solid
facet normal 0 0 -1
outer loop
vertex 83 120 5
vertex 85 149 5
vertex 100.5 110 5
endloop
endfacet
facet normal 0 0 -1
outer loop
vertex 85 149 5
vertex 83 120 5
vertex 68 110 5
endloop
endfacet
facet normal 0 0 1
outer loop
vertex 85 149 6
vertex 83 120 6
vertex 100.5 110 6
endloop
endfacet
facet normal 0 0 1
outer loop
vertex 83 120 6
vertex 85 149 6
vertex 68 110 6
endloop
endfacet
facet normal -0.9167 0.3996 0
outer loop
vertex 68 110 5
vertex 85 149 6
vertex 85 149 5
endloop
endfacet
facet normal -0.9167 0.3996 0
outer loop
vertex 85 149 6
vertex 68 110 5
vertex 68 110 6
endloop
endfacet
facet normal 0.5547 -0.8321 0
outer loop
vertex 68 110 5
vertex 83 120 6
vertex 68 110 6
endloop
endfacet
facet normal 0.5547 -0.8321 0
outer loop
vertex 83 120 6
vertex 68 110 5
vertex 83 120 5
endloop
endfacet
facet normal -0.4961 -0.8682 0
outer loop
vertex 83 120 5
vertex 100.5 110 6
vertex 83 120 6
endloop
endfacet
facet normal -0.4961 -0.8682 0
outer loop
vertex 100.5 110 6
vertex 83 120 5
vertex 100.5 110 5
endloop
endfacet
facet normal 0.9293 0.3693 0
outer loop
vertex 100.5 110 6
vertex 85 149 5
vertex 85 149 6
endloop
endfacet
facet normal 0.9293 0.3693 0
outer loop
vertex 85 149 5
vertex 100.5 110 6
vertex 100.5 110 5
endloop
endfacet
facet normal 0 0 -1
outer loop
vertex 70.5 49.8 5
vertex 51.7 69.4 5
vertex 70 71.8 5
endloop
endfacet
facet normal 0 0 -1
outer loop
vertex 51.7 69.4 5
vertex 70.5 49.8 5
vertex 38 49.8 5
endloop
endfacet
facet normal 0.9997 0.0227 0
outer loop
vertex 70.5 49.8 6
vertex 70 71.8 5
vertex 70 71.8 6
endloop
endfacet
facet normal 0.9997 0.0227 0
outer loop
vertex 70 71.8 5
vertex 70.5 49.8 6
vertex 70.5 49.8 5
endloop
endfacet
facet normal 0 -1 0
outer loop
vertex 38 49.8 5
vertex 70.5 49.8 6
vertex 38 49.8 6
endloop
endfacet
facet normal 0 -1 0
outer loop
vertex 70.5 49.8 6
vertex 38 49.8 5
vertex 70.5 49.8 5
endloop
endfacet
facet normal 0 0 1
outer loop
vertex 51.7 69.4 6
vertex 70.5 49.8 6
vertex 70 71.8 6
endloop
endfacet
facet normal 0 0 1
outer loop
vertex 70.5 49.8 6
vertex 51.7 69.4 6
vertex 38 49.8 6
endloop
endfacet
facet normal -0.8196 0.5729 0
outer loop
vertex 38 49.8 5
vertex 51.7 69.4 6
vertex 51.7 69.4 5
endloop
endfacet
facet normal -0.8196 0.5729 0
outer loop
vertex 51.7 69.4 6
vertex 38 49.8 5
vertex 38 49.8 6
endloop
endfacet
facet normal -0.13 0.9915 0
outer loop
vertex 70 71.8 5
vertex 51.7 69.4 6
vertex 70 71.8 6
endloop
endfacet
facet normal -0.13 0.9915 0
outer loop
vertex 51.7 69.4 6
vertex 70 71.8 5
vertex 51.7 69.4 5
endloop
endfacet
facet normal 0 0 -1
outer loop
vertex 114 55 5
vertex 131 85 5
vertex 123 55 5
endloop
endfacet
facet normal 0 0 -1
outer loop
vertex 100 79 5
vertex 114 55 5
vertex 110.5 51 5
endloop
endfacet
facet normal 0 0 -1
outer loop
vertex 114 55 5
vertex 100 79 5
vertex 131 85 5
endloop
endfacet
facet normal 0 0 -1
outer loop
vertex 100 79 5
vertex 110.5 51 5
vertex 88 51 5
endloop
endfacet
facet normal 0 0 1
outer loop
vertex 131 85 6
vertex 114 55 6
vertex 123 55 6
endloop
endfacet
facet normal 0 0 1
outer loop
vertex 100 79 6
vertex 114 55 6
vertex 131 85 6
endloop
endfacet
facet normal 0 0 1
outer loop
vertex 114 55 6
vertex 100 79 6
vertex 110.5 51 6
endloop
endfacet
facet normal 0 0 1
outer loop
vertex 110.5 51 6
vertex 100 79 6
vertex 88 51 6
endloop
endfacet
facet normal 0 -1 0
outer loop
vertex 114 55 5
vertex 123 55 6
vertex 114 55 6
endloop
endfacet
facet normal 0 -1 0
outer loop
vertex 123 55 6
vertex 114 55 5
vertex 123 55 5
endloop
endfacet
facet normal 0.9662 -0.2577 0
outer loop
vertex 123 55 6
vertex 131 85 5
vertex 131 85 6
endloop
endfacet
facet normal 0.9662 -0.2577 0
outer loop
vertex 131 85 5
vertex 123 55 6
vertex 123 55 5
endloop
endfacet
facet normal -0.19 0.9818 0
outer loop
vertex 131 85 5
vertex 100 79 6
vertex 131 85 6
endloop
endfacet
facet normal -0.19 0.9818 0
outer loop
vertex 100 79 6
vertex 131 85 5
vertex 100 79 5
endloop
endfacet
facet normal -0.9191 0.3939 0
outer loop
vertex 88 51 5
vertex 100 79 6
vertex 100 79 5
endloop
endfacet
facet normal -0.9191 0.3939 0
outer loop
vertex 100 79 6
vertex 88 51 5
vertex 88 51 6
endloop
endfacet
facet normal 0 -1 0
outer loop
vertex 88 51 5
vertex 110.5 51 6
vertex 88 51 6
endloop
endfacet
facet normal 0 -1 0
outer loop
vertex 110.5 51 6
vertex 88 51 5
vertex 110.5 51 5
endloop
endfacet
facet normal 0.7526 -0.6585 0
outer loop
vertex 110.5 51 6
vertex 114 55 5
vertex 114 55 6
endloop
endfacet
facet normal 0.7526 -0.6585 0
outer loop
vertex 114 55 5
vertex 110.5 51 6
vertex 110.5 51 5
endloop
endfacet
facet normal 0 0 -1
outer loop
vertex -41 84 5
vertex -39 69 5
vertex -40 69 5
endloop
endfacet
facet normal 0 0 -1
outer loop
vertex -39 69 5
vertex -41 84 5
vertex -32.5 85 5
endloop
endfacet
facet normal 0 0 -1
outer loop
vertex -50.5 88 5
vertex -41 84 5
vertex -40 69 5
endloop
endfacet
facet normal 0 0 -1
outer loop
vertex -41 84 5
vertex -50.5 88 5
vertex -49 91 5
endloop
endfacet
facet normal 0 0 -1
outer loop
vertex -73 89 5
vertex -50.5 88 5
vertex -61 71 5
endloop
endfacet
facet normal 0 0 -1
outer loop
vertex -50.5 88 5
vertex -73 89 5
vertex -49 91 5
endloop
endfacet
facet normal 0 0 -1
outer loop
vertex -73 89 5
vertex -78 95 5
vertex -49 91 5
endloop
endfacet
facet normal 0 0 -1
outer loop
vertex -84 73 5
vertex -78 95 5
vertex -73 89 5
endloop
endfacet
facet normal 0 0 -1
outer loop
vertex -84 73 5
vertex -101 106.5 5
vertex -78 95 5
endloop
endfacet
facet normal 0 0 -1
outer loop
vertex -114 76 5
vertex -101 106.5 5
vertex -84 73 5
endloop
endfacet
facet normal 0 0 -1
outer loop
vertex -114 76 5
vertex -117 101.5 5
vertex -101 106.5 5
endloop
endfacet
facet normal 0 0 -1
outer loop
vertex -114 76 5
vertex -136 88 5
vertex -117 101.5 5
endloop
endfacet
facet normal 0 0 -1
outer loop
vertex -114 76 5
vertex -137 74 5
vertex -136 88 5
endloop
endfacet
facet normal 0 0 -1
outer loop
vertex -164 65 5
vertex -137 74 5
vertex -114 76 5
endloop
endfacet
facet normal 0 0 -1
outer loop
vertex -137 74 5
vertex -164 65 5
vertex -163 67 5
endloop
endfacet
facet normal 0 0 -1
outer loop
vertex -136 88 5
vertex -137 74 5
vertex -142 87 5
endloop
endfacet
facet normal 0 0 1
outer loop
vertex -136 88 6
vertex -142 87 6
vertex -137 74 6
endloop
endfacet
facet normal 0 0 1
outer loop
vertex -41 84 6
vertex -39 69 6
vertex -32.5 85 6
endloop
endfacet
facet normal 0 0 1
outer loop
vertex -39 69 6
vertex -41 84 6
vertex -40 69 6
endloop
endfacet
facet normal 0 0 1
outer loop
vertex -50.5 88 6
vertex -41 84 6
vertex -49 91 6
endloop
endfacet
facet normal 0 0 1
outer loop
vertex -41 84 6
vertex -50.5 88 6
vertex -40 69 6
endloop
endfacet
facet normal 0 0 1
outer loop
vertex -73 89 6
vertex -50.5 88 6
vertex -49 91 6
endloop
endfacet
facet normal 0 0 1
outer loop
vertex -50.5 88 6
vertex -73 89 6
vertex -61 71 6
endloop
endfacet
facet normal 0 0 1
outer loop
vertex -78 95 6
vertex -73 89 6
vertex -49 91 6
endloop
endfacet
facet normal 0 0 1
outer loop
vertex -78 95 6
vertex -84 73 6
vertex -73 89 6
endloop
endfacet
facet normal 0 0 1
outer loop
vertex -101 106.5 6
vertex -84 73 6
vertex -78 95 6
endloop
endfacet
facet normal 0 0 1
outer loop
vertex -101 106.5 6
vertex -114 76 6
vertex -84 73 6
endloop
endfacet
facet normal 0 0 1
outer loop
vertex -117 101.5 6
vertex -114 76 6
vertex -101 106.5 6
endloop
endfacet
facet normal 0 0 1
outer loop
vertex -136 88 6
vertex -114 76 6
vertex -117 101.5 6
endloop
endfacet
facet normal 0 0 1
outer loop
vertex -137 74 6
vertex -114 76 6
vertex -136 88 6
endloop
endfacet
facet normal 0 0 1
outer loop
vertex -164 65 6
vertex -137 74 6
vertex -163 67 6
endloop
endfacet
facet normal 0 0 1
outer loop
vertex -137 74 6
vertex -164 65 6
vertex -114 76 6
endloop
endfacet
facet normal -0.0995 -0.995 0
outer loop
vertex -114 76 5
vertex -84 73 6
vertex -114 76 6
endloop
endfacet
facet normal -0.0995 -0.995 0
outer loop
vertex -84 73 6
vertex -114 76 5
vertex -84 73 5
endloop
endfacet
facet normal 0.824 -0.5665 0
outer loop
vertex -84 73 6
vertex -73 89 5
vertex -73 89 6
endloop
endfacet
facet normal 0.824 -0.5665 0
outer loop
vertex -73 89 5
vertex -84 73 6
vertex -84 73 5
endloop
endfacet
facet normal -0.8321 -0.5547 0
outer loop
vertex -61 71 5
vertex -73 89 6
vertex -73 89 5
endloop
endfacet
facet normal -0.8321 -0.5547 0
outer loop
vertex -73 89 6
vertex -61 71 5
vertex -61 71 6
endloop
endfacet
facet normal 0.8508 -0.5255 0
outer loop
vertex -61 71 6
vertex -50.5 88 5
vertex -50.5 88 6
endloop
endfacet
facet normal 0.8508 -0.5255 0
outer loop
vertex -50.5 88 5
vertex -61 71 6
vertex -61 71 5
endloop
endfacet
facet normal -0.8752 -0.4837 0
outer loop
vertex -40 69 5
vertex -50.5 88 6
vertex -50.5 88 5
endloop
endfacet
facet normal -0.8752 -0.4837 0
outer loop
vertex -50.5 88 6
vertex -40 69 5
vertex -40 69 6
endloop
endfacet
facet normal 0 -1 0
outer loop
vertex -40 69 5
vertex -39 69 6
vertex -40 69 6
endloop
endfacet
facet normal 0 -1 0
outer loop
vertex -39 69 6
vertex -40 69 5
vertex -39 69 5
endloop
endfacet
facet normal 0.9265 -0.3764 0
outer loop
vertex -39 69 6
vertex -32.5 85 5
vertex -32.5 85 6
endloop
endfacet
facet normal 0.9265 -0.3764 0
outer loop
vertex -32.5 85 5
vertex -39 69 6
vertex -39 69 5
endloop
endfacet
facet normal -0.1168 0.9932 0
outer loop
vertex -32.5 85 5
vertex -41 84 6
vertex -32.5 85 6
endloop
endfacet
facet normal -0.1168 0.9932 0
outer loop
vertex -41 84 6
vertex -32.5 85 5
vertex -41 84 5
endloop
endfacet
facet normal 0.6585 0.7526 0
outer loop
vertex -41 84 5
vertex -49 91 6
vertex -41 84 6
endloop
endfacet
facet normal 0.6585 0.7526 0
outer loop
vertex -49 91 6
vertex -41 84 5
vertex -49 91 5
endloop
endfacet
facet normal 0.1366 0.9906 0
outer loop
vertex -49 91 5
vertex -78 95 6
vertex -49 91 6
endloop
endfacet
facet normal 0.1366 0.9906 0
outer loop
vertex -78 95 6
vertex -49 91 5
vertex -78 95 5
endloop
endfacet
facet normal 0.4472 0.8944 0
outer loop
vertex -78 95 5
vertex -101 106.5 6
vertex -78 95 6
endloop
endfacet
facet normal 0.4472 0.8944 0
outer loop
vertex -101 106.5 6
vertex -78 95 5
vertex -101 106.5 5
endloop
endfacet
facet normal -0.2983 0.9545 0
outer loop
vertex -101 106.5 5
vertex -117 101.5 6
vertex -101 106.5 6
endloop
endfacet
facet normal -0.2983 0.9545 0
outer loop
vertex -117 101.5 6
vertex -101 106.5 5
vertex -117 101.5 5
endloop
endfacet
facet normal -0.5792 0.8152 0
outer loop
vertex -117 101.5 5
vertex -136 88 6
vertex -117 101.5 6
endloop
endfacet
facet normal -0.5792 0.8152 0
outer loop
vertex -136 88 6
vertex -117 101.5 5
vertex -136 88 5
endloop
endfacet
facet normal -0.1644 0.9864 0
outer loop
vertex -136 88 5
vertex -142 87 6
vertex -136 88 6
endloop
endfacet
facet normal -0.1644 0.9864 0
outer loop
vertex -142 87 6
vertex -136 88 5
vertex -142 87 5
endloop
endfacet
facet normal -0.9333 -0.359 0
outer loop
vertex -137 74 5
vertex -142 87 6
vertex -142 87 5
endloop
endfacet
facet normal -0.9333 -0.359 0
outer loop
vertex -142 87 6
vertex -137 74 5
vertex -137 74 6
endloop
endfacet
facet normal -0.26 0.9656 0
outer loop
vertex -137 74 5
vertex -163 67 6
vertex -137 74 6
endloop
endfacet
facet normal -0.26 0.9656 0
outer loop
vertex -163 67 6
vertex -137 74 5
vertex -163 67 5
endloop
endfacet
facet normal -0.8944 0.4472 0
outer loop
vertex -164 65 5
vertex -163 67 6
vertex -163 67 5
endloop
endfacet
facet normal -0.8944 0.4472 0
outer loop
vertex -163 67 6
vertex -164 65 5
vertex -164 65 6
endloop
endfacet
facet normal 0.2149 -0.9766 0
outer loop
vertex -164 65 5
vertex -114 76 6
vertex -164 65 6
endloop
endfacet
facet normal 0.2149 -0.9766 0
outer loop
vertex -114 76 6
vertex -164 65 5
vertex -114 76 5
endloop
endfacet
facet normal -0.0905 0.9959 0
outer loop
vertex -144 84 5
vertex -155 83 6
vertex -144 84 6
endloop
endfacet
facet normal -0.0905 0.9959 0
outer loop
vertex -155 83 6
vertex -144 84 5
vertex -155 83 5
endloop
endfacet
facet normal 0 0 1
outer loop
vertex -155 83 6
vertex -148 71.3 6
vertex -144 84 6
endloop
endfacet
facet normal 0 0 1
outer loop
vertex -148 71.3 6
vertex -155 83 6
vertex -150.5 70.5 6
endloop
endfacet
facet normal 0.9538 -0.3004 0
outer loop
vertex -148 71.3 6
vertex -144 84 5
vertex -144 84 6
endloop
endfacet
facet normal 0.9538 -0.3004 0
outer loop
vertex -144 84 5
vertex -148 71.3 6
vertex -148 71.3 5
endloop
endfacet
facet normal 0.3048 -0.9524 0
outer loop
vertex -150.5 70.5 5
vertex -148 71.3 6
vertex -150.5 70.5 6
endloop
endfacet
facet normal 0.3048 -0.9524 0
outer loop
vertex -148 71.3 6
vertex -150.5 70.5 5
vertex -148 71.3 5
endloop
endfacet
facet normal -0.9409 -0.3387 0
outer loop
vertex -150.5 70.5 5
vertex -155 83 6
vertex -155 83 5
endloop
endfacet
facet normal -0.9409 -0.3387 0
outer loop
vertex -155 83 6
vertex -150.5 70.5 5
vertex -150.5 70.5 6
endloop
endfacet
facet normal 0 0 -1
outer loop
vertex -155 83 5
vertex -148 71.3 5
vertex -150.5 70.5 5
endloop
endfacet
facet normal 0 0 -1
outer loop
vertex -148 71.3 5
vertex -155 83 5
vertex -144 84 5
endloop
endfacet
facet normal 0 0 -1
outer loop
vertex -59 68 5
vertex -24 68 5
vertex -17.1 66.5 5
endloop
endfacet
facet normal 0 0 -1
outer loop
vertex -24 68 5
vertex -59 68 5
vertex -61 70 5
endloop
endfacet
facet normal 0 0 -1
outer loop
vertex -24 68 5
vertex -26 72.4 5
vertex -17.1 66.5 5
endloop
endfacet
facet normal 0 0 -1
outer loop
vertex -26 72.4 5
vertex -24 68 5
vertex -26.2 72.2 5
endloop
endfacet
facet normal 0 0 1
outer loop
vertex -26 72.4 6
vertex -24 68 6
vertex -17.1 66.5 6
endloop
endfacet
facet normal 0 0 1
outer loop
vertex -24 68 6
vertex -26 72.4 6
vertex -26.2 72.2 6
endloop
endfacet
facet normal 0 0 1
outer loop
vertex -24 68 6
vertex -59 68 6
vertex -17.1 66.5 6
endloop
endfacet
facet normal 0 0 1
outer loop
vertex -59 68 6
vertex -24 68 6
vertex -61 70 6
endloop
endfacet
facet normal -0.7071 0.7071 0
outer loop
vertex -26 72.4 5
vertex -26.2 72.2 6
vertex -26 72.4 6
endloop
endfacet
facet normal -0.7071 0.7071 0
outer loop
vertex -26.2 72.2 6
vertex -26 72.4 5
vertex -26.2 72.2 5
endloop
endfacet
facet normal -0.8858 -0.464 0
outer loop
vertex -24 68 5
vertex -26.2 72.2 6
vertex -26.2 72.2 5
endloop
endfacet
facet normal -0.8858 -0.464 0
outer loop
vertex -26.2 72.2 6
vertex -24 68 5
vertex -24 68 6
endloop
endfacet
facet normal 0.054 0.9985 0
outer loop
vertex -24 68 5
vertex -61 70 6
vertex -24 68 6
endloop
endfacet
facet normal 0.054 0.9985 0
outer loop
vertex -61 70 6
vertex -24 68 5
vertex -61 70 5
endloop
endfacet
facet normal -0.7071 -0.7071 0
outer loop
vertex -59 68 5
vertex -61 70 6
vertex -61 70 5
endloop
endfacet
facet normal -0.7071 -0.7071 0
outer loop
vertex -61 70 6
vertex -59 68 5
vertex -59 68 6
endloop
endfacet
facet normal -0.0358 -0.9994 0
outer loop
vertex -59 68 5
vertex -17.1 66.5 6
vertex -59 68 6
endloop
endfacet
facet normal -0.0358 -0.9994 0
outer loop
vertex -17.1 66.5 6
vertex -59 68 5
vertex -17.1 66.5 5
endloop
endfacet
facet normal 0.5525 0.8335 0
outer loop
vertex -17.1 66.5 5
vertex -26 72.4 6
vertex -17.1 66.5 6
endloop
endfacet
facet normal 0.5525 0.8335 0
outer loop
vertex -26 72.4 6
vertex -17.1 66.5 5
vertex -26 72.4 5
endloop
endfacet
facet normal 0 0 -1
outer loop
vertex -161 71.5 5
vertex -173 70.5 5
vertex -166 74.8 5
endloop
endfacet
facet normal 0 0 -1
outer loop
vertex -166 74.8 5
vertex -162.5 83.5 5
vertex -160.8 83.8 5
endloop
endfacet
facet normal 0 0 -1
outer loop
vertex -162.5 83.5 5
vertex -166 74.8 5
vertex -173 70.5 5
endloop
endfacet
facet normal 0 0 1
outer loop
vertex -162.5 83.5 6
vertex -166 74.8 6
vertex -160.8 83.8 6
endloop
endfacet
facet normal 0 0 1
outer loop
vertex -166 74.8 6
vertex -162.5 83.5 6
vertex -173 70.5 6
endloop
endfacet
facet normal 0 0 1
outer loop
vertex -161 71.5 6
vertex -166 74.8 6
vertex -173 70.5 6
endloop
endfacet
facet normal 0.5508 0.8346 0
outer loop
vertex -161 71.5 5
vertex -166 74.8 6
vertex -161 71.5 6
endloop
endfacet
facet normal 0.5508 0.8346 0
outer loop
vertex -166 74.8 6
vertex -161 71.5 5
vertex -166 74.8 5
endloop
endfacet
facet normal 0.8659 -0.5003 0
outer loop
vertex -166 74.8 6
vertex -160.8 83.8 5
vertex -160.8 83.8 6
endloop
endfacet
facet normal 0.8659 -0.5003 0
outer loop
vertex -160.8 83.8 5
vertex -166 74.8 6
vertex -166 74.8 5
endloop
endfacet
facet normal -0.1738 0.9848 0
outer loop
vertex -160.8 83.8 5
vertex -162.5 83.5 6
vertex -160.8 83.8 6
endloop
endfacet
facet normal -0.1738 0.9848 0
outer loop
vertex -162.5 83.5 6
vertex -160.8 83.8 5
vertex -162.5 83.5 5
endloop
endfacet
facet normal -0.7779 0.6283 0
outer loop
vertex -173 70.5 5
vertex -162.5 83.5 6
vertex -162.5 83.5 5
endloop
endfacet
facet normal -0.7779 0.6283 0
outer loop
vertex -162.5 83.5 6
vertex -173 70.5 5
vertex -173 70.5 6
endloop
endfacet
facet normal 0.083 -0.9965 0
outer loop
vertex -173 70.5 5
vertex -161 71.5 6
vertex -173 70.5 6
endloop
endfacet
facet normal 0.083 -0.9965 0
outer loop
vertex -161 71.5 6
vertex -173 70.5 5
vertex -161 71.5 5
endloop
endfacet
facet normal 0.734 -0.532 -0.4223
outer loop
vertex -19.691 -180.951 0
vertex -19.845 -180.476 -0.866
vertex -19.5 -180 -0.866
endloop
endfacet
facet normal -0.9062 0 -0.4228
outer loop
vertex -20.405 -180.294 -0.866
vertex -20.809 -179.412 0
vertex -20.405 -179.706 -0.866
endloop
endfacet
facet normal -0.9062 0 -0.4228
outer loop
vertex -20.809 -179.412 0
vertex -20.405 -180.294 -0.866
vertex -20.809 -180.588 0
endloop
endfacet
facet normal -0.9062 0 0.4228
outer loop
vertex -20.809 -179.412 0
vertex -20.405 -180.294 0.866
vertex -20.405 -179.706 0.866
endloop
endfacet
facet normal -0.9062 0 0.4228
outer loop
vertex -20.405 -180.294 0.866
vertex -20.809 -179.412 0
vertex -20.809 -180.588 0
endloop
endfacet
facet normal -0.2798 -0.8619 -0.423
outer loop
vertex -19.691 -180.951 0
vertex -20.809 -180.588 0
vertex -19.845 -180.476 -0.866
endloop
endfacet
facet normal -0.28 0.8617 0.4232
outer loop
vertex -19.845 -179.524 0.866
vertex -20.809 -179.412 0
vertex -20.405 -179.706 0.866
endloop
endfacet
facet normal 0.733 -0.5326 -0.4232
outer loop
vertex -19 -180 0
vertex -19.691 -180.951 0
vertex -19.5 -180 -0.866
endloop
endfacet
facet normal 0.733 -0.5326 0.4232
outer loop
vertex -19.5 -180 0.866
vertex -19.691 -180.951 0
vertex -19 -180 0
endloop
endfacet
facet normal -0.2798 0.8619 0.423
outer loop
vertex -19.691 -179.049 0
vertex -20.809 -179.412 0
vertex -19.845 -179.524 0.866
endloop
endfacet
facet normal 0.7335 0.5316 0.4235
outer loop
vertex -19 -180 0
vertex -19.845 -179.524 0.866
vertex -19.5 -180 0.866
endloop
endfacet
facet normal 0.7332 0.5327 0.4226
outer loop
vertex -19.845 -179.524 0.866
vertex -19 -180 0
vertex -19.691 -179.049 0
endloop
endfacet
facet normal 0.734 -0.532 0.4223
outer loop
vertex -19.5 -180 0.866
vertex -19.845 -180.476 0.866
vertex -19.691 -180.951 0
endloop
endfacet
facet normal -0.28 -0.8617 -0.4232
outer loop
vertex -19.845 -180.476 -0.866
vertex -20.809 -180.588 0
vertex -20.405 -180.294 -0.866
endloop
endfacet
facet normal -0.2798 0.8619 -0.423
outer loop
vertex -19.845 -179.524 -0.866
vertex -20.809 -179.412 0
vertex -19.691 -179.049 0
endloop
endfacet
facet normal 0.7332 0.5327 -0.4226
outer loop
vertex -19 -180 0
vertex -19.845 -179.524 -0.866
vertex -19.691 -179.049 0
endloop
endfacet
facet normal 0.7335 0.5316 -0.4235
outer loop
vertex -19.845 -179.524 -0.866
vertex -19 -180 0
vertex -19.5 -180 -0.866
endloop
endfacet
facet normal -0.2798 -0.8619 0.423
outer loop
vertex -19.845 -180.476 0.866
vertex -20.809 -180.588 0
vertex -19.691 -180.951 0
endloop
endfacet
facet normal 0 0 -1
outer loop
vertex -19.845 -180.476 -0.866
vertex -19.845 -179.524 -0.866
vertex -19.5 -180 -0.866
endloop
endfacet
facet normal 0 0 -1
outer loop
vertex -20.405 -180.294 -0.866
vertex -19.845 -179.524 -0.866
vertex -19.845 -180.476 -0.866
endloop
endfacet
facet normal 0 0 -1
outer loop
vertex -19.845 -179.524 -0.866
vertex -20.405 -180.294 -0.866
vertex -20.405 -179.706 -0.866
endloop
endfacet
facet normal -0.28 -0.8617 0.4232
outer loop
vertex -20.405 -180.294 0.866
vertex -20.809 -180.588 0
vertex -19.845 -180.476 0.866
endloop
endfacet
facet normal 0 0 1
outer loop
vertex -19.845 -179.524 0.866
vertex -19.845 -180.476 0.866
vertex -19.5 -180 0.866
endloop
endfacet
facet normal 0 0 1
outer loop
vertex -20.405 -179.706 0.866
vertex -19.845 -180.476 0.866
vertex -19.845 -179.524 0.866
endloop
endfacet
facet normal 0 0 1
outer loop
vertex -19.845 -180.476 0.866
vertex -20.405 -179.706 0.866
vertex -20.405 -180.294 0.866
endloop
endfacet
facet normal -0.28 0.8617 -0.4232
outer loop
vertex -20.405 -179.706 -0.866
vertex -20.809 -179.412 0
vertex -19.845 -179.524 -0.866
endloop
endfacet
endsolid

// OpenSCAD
// Nufringen 2

Silouhette = true;
Kirchendach = true;
Rathausdach = true;

Hafte = true;

module Silouhette()
{
$fn=60;
Skalierung = 2.0;

     scale([Skalierung,Skalierung,1.0])
     linear_extrude(height = 5) {
            scale(0.15)
            import("Silouhette.dxf");
        }
        
}  


module Turmdach()
{
    linear_extrude(height = 1)
    {
        polygon([[0,0],[15,10],[32.5,0],[17,39]]);
    }
}

module Kirchendach1()
{
    linear_extrude(height = 1)
    {
        polygon([[0,0],[32.5,0],[32,22],[13.7,19.6]]);
    }
}

module Kirchendach2()
{
    linear_extrude(height = 1)
    {
        polygon([[0,0],[22.5,0],[26,4],[35,4],[43,34],[12,28]]);
    }
}

module Rathausdach1()
{
    linear_extrude(height = 1)
    {
        polygon([
        [0,0],
        [50,11],
        [80,8],
        [91,24],
        [103,6],
        [113.5,23],
        [124,4],
        [125,4],
        [131.5,20],
        [123,19],
        [115,26],
        [86,30],
        [63,41.5],
        [47,36.5],
        [28,23],
        [22,22],
        [27,9],
        [1,2]]);
    }
}

module Rathausdach2()
{
    linear_extrude(height = 1)
    {
        polygon([
        [1,1],
        [5.5,-11.5],
        [8,-10.7],
        [12,2]]);
    }
}

module Rathausdach3()
{
    linear_extrude(height = 1)
    {
        polygon([
        [1,1],
        [3,-1],
        [44.9,-2.5],
        [36,3.4],
        [35.8,3.2],
        [38,-1]]);
    }
}

module Rathausdach4()
{
    linear_extrude(height = 1)
    {
        polygon([
        [0,0],
        [10.5,13],
        [12.2,13.3],
        [7,4.3],
        [12,1]]);
    }
}

module Hafte()
{
$fn=60;
Skalierung = 2.0;

     scale([Skalierung,Skalierung,1.0])
     linear_extrude(height = 5) {
            scale(0.15)
            import("Hafte.dxf");
        }
      
}

if (Silouhette)
{
    translate([-200,-50,0])
    color("white")
    Silouhette();
}
if (Kirchendach)
{
    translate([68,110,5])
    color("red")
    Turmdach();

    translate([38,49.8,5])
    color("red")
    Kirchendach1();

    translate([88,51,5])
    color("red")
    Kirchendach2();
}

if (Rathausdach)
{
    translate([-164,65,5])
    color("red")
    Rathausdach1();

    translate([-156,82,5])
    color("red")
    Rathausdach2();

    translate([-62,69,5])
    color("red")
    Rathausdach3();

    translate([-173,70.5,5])
    color("red")
    Rathausdach4();
}

if (Hafte)
    translate([-20,-180,0])
    minkowski()
    {
    Hafte();
    sphere();
    }
